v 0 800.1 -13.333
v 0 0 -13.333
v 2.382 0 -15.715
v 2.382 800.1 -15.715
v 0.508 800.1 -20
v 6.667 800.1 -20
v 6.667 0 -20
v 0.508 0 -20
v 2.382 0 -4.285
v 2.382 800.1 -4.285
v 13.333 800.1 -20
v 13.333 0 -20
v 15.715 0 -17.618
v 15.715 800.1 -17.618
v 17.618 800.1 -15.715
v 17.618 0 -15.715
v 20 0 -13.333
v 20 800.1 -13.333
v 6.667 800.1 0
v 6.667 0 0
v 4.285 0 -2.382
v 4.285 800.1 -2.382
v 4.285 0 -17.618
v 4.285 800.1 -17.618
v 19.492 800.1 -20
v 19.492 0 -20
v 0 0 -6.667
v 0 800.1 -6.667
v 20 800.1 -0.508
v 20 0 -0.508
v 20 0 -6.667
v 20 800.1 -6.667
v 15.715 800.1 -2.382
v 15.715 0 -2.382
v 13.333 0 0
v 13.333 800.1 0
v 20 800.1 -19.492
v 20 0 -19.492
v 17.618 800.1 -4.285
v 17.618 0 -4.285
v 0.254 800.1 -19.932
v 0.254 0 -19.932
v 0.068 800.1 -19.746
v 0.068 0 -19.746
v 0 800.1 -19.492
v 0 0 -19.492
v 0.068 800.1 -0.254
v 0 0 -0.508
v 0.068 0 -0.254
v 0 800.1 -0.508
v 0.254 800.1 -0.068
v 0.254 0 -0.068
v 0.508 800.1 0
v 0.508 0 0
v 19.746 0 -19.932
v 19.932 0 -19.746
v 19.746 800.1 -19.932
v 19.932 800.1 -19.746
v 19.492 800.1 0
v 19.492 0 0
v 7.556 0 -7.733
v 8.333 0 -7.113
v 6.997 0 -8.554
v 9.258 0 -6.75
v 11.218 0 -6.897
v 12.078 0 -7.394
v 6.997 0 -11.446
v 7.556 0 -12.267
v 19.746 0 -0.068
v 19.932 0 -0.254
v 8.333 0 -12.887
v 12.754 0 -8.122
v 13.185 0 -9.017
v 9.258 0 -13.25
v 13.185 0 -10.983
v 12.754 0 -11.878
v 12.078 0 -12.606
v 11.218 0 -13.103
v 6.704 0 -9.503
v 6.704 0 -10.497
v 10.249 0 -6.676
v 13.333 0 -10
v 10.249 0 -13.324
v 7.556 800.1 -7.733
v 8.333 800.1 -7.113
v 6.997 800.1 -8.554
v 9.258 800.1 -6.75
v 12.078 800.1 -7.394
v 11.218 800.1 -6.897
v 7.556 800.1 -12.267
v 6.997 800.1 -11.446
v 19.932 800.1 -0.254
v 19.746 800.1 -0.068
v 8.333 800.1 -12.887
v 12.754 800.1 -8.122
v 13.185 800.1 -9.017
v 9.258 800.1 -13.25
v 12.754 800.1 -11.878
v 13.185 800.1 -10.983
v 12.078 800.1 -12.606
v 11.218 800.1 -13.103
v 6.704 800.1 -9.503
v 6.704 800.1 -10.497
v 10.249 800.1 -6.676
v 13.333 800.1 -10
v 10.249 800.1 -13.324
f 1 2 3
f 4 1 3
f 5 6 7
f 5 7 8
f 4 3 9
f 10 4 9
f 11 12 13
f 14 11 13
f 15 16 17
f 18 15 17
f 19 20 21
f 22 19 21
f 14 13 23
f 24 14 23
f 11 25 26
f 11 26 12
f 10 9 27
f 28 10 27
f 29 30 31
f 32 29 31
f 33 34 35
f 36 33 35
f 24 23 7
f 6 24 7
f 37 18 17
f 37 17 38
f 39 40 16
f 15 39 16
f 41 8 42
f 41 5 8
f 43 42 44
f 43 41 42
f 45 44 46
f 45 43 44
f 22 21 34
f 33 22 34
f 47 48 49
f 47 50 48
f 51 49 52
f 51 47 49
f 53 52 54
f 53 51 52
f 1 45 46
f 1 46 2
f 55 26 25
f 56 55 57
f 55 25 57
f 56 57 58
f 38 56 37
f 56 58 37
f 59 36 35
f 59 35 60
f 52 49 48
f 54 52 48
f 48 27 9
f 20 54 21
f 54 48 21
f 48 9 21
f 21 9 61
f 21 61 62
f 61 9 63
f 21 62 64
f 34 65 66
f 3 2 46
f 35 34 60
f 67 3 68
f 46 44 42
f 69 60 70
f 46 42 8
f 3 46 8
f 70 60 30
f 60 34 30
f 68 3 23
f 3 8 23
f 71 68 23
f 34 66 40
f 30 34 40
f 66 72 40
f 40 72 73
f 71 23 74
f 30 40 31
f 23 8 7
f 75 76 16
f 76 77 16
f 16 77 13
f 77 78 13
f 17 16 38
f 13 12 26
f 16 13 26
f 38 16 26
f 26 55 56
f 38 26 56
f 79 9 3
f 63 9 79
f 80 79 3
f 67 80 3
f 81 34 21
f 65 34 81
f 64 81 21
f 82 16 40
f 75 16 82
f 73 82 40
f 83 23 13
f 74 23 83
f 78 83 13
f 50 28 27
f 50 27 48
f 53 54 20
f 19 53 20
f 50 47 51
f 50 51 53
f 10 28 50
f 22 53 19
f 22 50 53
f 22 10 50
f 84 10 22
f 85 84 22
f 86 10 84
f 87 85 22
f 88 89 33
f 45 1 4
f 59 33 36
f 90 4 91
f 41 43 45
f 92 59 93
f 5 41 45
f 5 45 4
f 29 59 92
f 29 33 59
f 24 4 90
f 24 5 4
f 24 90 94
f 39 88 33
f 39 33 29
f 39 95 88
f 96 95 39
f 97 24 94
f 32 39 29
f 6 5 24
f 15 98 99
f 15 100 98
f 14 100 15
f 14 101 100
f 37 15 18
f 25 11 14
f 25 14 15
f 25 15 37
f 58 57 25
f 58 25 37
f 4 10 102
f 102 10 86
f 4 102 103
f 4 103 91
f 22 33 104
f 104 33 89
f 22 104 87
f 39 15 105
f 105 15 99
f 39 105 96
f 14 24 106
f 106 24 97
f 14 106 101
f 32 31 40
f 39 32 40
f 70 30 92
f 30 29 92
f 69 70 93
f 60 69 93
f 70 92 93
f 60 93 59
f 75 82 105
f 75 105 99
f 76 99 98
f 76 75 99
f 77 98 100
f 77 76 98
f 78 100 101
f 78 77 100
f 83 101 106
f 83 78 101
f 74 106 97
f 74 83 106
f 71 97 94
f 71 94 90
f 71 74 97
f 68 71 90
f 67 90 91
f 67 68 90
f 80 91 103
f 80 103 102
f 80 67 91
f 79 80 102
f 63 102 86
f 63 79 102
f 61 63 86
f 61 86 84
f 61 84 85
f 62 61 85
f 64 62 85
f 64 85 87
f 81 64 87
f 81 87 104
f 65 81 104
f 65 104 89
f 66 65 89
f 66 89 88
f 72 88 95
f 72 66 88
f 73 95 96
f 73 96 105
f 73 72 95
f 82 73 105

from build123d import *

# Parameters (mm, degrees)
SKETCH1_R           = 3.333333333
BOSS_EXTRUDE1_DEPTH = 800.1
FILLET4_R           = 0.508


with BuildPart() as part:
    # Sketch1 → Boss-Extrude1 (new body)
    with BuildSketch(Plane(origin=(0, 0, 0), x_dir=(1, 0, 0), z_dir=(0, 1, 0))):
        Polygon((4.285, 17.618333333), (6.666666667, 20), (0, 20), (0, 13.333333333), (2.381666667, 15.715), (2.381666667, 4.285), (0, 6.666666667), (0, 0), (6.666666667, 0), (4.285, 2.381666667), (15.715, 2.381666667), (13.333333333, 0), (20, 0), (20, 6.666666667), (17.618333333, 4.285), (17.618333333, 15.715), (20, 13.333333333), (20, 20), (13.333333333, 20), (15.715, 17.618333333), align=None)
        with Locations((10, 10)):
            Circle(SKETCH1_R, mode=Mode.SUBTRACT)
    extrude(amount=BOSS_EXTRUDE1_DEPTH)

    # Fillet4
    fillet4_edges = [part.edges().sort_by_distance(p)[0] for p in [
        (20, 400.05, 0),
        (0, 400.05, 0),
        (0, 400.05, -20),
        (20, 400.05, -20),
    ]]
    fillet(fillet4_edges, radius=FILLET4_R)


solid = part.part
